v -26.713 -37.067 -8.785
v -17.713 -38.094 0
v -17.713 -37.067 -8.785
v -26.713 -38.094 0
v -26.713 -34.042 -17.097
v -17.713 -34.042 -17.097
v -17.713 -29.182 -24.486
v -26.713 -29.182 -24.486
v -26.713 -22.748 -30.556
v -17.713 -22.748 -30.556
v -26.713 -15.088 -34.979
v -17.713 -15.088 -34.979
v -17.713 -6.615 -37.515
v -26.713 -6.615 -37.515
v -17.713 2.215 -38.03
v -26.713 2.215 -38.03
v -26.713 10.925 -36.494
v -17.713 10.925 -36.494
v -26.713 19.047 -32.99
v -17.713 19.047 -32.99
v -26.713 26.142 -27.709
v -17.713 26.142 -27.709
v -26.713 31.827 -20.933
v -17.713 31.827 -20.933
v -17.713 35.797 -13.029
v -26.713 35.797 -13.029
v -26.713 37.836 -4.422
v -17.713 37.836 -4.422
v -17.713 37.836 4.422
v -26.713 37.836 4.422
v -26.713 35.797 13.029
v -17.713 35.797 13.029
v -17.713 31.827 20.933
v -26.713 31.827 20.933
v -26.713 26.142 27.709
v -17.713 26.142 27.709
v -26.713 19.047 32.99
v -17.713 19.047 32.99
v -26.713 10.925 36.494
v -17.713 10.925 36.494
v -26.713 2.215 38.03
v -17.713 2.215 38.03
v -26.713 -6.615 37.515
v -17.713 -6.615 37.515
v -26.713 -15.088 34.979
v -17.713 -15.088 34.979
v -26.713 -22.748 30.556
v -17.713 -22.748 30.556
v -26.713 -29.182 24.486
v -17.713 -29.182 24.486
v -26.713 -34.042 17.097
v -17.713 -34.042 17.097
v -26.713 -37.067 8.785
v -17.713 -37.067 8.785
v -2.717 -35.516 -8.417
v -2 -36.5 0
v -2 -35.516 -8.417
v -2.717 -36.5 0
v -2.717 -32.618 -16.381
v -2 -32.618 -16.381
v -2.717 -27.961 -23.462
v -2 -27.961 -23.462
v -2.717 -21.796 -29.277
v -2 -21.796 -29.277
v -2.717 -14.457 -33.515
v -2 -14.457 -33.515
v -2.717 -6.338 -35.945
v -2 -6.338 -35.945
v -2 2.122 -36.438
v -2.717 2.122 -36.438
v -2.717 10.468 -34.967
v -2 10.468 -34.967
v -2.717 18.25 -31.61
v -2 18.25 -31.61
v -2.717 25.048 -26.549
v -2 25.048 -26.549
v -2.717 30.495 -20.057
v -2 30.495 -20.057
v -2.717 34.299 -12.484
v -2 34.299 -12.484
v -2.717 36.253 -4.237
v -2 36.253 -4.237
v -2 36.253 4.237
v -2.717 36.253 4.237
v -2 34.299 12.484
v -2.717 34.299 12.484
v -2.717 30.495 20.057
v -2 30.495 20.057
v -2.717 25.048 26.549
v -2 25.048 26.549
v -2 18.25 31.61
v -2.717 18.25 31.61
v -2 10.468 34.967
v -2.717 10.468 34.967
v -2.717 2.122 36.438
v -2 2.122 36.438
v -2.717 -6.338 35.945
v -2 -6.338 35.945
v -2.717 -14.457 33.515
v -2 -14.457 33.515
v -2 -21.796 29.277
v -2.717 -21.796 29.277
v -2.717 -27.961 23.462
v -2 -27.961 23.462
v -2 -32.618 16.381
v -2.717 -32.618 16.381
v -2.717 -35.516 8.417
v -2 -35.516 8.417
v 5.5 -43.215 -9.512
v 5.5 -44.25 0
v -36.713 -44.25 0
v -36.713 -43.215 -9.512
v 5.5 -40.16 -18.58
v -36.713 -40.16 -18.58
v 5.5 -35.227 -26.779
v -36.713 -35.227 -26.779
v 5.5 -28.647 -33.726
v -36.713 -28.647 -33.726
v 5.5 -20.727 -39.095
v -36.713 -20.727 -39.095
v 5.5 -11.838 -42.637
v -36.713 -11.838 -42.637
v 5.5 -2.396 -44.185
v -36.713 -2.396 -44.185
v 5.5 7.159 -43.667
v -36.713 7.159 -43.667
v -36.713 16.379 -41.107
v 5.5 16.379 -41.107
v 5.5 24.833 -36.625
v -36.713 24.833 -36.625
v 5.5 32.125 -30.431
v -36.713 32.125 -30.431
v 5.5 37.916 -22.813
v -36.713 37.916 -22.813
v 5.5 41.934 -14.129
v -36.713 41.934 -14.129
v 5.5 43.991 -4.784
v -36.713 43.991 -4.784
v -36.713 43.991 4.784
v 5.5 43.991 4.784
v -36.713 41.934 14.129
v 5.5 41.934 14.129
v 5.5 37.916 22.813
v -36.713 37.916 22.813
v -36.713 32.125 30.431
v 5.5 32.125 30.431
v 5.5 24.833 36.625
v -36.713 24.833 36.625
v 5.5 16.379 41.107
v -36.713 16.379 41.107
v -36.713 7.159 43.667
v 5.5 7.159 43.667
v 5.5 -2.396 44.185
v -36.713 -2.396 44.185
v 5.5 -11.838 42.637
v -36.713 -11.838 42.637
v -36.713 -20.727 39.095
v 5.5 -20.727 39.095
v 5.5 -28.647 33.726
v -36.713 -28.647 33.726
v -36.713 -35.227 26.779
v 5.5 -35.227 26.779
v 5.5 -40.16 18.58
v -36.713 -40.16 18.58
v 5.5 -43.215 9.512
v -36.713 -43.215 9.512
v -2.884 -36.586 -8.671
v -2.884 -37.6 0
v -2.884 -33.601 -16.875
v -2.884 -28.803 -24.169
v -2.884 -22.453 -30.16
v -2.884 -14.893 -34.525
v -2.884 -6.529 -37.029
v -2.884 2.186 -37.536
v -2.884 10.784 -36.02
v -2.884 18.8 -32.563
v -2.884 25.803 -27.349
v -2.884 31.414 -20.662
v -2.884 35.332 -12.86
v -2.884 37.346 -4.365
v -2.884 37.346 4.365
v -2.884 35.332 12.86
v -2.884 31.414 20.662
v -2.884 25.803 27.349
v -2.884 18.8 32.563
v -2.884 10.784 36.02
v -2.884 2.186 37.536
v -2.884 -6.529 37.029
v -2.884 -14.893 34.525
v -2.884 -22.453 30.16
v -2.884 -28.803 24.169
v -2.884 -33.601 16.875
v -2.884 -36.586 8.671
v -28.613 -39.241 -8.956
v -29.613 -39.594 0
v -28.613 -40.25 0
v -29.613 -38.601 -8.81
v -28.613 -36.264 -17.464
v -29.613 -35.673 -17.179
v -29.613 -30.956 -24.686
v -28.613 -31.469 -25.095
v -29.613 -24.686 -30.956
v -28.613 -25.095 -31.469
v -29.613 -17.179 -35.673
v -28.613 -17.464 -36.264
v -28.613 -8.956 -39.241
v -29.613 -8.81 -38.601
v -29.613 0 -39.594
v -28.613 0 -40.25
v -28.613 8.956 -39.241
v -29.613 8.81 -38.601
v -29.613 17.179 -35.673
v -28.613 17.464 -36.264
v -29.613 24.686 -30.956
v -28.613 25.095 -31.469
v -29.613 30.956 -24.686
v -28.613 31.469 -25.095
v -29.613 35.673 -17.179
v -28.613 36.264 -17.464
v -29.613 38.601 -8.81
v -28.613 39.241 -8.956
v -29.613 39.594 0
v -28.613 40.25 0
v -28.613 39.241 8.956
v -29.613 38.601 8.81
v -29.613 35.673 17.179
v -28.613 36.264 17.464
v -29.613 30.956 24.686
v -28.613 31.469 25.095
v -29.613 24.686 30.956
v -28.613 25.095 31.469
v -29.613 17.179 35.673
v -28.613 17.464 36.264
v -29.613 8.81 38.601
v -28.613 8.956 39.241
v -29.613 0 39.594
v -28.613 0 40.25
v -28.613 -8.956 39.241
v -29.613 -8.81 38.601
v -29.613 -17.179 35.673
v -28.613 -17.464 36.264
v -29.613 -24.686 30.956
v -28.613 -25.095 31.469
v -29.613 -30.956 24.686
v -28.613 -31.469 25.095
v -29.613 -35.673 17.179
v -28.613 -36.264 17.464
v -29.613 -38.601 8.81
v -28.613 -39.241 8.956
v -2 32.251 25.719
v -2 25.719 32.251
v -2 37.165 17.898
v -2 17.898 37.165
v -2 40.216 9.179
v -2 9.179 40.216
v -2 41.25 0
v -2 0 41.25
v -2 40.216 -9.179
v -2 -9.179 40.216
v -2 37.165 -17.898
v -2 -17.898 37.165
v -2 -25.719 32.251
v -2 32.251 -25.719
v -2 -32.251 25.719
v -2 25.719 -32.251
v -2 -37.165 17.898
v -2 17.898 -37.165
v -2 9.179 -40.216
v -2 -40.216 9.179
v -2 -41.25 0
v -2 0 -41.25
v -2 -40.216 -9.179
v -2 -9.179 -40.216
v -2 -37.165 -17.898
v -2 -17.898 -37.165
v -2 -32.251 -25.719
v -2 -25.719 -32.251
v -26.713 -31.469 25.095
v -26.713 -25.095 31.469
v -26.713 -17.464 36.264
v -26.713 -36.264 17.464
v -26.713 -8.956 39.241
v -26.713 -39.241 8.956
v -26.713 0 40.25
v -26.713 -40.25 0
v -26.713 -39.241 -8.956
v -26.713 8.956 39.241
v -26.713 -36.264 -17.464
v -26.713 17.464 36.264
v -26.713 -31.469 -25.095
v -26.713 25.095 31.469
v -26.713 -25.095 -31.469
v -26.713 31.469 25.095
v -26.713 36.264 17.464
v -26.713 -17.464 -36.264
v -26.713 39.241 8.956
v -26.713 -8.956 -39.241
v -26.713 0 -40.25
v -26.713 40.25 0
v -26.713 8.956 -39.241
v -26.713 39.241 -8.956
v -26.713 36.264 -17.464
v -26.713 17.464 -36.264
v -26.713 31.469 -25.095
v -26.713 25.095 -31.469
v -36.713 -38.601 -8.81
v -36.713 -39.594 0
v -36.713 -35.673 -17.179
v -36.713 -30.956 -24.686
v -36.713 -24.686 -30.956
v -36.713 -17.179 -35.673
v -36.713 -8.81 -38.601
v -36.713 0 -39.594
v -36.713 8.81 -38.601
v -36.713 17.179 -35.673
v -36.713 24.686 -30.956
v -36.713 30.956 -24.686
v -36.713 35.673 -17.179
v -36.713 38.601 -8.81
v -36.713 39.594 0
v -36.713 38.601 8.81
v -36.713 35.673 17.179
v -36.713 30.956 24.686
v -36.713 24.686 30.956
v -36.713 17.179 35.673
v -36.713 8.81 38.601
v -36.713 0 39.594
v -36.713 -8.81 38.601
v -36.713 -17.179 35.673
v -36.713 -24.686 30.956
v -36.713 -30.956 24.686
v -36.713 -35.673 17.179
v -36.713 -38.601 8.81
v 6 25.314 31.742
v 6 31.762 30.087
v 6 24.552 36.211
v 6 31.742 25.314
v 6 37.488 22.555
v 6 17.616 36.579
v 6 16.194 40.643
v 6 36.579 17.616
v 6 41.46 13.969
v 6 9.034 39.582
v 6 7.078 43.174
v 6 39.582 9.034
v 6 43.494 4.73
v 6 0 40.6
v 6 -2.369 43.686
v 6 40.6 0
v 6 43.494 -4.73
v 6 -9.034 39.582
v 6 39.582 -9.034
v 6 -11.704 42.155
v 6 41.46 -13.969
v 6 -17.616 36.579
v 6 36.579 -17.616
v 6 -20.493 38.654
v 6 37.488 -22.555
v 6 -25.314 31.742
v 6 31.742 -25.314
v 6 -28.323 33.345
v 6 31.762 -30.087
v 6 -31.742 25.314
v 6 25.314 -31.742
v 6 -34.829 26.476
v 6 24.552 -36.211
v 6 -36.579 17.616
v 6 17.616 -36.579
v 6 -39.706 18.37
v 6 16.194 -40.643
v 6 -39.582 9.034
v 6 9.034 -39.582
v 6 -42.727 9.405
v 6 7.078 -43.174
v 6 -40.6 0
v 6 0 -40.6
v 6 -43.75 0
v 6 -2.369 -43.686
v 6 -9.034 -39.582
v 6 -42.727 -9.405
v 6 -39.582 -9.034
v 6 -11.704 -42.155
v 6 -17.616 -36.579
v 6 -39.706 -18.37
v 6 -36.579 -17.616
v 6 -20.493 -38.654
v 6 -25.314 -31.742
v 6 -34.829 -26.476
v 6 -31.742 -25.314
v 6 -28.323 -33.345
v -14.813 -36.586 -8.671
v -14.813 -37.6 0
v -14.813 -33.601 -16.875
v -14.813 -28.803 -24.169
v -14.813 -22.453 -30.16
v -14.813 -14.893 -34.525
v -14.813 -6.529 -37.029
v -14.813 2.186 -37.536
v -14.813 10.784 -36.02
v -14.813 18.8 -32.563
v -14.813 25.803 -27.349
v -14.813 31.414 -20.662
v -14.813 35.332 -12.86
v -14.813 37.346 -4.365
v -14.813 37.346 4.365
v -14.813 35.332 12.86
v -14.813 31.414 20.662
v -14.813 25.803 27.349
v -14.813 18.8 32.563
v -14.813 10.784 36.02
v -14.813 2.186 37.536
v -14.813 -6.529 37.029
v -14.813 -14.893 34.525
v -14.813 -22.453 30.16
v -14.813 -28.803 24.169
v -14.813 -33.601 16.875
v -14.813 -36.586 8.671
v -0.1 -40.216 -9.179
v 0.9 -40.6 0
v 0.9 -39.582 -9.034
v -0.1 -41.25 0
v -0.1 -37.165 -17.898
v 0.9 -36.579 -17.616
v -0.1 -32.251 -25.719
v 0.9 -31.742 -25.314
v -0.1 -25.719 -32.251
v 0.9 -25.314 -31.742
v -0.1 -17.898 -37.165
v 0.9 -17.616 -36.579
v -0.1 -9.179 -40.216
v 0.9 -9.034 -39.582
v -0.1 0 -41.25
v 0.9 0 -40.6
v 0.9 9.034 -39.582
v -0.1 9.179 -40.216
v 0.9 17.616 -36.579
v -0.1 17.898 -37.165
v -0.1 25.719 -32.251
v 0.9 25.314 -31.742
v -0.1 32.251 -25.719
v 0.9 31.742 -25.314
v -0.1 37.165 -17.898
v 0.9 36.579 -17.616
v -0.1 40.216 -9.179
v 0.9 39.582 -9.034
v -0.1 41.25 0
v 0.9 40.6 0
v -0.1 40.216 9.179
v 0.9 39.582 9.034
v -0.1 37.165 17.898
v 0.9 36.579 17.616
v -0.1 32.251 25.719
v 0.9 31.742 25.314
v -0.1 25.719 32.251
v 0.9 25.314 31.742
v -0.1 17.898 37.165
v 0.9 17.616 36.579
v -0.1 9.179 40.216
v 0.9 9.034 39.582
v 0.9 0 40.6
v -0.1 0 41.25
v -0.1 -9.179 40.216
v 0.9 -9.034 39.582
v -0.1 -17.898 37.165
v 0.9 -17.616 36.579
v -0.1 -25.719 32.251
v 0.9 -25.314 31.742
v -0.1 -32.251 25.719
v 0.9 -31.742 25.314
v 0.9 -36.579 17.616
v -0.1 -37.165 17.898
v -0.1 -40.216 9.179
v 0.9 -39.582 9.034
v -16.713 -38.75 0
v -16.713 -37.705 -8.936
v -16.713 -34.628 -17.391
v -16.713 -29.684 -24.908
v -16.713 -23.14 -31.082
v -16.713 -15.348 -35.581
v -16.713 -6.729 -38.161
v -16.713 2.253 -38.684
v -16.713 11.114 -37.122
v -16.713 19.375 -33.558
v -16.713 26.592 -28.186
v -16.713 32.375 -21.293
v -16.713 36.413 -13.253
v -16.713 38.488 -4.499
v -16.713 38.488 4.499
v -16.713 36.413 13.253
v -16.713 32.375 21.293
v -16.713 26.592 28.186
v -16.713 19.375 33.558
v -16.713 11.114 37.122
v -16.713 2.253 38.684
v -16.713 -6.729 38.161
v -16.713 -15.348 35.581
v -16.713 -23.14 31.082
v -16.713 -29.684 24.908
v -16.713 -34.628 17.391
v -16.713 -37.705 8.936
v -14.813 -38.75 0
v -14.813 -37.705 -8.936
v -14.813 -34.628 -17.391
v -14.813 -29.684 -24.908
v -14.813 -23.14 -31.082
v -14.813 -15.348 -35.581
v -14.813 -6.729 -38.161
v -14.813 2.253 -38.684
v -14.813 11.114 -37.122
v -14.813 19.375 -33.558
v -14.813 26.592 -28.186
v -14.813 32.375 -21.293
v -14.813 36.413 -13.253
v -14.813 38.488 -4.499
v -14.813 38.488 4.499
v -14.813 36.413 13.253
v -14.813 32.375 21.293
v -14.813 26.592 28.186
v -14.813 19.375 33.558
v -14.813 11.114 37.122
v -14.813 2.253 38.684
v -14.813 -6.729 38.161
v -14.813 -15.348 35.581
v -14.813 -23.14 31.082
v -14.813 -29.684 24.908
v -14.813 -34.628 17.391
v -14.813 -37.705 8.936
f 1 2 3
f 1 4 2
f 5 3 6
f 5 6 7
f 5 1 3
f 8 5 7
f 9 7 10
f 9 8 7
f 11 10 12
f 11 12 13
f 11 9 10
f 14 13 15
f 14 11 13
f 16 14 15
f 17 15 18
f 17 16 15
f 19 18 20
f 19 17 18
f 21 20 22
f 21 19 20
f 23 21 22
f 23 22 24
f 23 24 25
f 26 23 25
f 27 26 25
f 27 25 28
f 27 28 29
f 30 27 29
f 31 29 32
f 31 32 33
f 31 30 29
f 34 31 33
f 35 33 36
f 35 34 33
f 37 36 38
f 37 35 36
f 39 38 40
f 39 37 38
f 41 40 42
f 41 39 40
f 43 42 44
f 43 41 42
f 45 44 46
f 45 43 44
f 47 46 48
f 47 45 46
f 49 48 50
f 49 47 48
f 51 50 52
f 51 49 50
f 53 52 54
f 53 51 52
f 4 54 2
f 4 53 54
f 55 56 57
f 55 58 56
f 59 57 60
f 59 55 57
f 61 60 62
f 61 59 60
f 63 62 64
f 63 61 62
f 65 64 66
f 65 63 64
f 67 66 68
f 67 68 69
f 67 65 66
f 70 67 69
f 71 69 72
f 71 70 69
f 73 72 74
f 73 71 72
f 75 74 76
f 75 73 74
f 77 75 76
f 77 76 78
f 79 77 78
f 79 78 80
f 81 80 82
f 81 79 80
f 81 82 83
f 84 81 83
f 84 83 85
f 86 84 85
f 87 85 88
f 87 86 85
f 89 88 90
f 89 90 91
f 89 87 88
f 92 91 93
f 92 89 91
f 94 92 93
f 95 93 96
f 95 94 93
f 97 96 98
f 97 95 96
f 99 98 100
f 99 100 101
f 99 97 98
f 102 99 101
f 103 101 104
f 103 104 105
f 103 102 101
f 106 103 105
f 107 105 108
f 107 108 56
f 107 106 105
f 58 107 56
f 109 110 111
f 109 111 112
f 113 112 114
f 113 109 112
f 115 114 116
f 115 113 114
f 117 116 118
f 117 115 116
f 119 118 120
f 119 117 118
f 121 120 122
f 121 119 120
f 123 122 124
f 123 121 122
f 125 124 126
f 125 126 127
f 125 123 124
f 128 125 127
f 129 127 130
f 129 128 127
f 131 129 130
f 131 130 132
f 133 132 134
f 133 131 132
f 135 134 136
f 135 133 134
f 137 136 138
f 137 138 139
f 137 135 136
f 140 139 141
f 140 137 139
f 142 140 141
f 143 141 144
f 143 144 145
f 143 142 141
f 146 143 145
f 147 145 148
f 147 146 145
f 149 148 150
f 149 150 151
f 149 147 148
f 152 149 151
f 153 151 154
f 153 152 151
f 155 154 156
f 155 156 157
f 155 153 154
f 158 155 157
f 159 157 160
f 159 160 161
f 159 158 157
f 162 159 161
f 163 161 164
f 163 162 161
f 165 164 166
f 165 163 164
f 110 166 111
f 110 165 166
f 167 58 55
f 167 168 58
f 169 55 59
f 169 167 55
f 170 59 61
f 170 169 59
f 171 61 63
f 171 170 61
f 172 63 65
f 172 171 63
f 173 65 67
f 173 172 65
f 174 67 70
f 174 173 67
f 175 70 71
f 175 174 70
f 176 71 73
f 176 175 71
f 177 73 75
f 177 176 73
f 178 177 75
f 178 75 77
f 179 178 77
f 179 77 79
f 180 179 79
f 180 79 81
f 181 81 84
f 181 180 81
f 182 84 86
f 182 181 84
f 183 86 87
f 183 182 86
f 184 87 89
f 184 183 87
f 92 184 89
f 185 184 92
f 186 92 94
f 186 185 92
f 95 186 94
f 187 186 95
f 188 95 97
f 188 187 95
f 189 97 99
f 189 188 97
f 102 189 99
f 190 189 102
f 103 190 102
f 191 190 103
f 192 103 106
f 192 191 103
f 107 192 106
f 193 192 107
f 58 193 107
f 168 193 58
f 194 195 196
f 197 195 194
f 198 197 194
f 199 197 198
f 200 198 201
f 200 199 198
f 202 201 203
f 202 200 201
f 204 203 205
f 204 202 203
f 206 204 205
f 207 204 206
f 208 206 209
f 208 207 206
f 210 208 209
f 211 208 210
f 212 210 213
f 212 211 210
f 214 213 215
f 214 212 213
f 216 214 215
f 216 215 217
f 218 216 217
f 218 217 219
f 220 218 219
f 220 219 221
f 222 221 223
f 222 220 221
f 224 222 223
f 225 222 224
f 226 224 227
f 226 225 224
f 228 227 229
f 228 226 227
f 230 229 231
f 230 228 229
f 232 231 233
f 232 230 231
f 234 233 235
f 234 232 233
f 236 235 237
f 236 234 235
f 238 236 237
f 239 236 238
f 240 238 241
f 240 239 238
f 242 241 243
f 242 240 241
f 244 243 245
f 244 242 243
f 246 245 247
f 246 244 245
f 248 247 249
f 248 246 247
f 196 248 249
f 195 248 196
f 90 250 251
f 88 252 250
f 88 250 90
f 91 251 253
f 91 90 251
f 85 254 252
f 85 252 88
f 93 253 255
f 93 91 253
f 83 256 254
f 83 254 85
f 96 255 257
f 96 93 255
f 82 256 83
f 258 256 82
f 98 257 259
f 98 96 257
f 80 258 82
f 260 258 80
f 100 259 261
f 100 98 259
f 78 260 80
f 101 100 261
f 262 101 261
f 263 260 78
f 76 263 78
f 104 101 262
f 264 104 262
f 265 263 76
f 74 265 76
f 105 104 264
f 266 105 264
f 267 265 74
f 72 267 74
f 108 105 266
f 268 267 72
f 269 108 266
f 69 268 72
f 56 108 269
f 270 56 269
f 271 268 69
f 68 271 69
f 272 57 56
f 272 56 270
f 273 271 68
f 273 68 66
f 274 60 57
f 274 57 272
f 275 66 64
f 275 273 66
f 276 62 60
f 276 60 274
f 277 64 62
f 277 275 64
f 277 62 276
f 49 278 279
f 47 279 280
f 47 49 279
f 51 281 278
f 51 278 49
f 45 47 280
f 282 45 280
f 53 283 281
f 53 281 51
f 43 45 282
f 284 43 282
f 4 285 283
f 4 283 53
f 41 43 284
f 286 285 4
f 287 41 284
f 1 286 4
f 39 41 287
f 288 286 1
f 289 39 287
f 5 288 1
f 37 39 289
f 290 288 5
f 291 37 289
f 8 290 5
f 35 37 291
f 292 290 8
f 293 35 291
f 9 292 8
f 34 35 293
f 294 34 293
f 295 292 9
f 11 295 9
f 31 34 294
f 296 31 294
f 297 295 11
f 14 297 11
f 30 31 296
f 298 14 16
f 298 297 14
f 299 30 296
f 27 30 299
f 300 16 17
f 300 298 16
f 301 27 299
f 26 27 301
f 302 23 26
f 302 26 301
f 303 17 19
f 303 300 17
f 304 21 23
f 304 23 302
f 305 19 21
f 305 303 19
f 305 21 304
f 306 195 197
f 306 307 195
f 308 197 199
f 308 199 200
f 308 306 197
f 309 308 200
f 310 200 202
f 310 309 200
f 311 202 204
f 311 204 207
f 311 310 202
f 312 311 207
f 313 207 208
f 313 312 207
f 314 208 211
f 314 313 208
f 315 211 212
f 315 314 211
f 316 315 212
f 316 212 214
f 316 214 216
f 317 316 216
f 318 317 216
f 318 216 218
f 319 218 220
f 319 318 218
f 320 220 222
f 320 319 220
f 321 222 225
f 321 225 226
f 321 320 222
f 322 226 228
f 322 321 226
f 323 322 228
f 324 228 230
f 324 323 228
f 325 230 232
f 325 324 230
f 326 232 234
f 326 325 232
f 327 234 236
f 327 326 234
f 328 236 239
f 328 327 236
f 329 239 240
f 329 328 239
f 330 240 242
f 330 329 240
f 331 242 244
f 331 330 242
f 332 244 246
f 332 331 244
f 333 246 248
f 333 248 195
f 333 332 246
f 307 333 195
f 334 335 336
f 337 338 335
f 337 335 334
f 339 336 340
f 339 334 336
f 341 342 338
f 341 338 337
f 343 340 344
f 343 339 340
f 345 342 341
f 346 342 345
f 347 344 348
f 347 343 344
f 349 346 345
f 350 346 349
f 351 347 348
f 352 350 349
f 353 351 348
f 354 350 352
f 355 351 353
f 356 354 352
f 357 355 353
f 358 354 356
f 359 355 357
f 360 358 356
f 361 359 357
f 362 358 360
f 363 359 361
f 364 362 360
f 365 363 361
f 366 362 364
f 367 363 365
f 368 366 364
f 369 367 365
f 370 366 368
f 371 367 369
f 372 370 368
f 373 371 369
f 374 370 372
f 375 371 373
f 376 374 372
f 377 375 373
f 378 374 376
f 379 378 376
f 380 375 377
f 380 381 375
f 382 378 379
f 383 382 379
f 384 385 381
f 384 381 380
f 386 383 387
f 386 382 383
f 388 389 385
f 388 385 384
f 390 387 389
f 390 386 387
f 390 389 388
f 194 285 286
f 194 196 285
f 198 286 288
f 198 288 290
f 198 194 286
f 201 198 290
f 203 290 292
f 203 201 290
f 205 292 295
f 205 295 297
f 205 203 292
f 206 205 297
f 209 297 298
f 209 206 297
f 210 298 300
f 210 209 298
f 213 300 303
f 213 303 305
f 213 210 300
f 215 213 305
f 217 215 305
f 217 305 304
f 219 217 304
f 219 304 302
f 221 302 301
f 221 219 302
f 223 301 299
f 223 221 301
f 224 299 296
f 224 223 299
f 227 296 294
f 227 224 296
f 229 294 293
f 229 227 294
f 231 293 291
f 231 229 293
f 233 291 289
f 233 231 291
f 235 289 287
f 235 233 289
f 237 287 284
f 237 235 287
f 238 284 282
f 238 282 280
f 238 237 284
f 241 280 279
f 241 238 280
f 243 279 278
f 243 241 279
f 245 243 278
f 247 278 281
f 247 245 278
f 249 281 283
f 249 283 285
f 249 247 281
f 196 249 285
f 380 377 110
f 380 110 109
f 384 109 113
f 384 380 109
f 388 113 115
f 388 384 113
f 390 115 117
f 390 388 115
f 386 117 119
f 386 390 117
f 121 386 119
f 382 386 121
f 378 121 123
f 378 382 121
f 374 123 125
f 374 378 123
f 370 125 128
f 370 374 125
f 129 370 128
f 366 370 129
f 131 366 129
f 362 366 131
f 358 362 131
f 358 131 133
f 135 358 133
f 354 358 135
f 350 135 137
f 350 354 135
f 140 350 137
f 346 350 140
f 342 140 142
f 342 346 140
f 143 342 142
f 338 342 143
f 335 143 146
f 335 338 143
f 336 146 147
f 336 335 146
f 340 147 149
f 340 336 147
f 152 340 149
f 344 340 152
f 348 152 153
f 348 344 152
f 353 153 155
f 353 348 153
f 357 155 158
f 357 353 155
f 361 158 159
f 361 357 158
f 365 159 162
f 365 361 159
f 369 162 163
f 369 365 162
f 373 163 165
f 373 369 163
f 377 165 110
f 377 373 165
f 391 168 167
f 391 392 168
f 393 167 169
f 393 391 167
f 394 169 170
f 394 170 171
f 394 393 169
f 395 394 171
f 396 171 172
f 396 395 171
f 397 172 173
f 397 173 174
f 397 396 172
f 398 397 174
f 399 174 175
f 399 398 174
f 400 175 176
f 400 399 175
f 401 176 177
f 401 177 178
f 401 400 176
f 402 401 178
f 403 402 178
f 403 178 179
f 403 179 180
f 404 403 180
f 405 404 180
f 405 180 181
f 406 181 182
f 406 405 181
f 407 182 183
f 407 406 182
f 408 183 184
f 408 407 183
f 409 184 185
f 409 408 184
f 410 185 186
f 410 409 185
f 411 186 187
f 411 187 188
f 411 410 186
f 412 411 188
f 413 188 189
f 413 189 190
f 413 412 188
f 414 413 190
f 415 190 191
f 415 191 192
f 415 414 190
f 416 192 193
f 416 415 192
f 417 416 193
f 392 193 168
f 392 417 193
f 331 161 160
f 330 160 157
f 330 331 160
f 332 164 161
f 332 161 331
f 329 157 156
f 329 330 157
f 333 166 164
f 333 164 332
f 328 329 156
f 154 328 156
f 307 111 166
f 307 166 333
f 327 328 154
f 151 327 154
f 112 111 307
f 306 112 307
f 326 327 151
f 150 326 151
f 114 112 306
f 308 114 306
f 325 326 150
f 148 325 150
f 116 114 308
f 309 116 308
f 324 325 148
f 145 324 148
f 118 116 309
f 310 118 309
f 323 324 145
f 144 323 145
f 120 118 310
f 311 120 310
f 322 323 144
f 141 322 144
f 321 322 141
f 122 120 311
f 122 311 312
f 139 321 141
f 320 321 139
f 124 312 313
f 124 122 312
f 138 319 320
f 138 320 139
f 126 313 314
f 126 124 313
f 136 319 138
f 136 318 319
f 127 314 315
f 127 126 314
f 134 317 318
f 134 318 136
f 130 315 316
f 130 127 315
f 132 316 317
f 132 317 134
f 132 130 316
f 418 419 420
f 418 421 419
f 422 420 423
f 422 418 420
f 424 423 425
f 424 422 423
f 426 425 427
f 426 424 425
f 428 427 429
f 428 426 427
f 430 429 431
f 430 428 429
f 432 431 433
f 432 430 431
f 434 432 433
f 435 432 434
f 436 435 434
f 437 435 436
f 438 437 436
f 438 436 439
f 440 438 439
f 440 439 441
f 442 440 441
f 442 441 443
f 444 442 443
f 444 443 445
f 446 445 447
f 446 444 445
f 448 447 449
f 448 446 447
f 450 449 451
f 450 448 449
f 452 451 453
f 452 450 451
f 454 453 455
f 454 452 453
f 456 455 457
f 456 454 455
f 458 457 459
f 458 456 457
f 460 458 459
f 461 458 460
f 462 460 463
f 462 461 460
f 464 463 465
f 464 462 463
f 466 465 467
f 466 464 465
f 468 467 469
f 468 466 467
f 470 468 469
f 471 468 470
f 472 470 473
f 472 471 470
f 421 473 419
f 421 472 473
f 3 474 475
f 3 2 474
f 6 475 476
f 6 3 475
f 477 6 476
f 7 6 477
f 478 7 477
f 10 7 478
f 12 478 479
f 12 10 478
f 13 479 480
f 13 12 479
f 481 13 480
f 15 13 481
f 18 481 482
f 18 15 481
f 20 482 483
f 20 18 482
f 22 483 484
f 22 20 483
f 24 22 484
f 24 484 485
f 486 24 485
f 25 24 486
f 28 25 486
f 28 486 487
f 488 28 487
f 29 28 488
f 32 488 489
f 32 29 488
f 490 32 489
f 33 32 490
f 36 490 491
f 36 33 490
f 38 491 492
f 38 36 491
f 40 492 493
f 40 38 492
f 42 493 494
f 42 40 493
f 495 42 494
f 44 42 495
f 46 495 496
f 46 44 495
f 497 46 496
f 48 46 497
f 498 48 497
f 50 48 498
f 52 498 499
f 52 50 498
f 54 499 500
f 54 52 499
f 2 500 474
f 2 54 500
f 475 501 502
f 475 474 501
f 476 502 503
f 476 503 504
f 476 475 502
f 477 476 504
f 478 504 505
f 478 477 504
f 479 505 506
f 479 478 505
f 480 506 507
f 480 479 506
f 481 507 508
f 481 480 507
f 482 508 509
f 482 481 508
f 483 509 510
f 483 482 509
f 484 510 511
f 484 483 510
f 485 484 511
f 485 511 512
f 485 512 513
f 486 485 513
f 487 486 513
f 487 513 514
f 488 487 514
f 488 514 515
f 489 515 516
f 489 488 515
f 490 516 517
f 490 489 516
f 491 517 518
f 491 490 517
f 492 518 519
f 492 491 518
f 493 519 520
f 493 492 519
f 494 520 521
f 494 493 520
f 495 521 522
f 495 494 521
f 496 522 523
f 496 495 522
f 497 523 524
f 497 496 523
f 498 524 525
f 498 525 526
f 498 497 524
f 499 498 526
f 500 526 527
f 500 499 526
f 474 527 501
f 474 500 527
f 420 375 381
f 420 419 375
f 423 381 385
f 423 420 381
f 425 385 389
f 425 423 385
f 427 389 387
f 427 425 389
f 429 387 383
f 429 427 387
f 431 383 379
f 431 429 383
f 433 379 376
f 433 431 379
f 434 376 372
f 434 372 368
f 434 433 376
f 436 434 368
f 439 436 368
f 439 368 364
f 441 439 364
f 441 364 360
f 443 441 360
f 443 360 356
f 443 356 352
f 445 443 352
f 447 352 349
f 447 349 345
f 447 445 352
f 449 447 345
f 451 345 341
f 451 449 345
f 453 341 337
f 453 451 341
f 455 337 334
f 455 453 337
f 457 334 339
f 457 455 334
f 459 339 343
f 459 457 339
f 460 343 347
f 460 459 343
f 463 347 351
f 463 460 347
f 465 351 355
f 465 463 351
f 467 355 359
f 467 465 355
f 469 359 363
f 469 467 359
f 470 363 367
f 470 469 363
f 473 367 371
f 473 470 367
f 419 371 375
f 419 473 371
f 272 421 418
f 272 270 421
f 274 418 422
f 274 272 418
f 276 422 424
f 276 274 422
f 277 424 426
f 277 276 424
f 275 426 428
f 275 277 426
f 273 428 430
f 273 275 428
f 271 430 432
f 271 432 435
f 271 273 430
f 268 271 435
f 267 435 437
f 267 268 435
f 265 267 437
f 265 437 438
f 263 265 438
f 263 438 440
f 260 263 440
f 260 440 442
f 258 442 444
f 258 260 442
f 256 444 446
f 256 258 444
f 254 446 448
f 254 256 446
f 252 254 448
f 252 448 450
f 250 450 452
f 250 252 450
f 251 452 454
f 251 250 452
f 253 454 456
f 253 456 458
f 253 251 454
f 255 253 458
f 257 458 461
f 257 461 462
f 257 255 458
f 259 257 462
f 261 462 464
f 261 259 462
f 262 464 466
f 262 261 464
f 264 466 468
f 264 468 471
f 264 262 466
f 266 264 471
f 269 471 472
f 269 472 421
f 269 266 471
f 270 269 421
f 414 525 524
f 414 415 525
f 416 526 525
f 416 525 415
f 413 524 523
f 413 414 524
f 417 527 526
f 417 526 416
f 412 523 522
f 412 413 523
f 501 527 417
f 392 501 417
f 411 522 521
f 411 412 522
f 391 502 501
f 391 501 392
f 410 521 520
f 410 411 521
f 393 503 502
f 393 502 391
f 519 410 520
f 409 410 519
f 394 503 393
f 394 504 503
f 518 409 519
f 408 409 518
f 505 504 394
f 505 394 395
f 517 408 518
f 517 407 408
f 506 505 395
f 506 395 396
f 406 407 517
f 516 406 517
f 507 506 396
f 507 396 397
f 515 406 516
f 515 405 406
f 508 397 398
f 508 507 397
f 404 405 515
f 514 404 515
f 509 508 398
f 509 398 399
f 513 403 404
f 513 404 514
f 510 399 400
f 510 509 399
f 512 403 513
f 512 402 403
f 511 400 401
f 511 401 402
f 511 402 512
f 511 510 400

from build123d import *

# Parameters (mm, degrees)
ZKOSEN_1_SIZE = 0.5


with BuildPart() as part:
    # Skica2 → Rotovat1 (revolve)
    with BuildSketch(Plane.XY):
        Polygon((-36.713340937, -44.25), (6, -44.25), (6, -40.6), (0.9, -40.6), (-0.1, -41.25), (-2, -41.25), (-2, -36.5), (-2.716675115, -36.5), (-2.883909622, -37.600000008), (-14.813340937, -37.600000008), (-14.813340937, -38.75), (-16.713340937, -38.75), (-17.713340937, -38.094), (-26.713340937, -38.094), (-26.713340937, -40.25), (-28.613340937, -40.25), (-29.613340937, -39.594), (-36.713340937, -39.594), align=None)
    revolve(axis=Axis((0, 0, 0), (1, 0, 0)))

    # Zkosení1
    zkosen_1_edges = [part.edges().sort_by_distance(p)[0] for p in [
        (6, 44.25, 0),
    ]]
    chamfer(zkosen_1_edges, length=ZKOSEN_1_SIZE)


solid = part.part
